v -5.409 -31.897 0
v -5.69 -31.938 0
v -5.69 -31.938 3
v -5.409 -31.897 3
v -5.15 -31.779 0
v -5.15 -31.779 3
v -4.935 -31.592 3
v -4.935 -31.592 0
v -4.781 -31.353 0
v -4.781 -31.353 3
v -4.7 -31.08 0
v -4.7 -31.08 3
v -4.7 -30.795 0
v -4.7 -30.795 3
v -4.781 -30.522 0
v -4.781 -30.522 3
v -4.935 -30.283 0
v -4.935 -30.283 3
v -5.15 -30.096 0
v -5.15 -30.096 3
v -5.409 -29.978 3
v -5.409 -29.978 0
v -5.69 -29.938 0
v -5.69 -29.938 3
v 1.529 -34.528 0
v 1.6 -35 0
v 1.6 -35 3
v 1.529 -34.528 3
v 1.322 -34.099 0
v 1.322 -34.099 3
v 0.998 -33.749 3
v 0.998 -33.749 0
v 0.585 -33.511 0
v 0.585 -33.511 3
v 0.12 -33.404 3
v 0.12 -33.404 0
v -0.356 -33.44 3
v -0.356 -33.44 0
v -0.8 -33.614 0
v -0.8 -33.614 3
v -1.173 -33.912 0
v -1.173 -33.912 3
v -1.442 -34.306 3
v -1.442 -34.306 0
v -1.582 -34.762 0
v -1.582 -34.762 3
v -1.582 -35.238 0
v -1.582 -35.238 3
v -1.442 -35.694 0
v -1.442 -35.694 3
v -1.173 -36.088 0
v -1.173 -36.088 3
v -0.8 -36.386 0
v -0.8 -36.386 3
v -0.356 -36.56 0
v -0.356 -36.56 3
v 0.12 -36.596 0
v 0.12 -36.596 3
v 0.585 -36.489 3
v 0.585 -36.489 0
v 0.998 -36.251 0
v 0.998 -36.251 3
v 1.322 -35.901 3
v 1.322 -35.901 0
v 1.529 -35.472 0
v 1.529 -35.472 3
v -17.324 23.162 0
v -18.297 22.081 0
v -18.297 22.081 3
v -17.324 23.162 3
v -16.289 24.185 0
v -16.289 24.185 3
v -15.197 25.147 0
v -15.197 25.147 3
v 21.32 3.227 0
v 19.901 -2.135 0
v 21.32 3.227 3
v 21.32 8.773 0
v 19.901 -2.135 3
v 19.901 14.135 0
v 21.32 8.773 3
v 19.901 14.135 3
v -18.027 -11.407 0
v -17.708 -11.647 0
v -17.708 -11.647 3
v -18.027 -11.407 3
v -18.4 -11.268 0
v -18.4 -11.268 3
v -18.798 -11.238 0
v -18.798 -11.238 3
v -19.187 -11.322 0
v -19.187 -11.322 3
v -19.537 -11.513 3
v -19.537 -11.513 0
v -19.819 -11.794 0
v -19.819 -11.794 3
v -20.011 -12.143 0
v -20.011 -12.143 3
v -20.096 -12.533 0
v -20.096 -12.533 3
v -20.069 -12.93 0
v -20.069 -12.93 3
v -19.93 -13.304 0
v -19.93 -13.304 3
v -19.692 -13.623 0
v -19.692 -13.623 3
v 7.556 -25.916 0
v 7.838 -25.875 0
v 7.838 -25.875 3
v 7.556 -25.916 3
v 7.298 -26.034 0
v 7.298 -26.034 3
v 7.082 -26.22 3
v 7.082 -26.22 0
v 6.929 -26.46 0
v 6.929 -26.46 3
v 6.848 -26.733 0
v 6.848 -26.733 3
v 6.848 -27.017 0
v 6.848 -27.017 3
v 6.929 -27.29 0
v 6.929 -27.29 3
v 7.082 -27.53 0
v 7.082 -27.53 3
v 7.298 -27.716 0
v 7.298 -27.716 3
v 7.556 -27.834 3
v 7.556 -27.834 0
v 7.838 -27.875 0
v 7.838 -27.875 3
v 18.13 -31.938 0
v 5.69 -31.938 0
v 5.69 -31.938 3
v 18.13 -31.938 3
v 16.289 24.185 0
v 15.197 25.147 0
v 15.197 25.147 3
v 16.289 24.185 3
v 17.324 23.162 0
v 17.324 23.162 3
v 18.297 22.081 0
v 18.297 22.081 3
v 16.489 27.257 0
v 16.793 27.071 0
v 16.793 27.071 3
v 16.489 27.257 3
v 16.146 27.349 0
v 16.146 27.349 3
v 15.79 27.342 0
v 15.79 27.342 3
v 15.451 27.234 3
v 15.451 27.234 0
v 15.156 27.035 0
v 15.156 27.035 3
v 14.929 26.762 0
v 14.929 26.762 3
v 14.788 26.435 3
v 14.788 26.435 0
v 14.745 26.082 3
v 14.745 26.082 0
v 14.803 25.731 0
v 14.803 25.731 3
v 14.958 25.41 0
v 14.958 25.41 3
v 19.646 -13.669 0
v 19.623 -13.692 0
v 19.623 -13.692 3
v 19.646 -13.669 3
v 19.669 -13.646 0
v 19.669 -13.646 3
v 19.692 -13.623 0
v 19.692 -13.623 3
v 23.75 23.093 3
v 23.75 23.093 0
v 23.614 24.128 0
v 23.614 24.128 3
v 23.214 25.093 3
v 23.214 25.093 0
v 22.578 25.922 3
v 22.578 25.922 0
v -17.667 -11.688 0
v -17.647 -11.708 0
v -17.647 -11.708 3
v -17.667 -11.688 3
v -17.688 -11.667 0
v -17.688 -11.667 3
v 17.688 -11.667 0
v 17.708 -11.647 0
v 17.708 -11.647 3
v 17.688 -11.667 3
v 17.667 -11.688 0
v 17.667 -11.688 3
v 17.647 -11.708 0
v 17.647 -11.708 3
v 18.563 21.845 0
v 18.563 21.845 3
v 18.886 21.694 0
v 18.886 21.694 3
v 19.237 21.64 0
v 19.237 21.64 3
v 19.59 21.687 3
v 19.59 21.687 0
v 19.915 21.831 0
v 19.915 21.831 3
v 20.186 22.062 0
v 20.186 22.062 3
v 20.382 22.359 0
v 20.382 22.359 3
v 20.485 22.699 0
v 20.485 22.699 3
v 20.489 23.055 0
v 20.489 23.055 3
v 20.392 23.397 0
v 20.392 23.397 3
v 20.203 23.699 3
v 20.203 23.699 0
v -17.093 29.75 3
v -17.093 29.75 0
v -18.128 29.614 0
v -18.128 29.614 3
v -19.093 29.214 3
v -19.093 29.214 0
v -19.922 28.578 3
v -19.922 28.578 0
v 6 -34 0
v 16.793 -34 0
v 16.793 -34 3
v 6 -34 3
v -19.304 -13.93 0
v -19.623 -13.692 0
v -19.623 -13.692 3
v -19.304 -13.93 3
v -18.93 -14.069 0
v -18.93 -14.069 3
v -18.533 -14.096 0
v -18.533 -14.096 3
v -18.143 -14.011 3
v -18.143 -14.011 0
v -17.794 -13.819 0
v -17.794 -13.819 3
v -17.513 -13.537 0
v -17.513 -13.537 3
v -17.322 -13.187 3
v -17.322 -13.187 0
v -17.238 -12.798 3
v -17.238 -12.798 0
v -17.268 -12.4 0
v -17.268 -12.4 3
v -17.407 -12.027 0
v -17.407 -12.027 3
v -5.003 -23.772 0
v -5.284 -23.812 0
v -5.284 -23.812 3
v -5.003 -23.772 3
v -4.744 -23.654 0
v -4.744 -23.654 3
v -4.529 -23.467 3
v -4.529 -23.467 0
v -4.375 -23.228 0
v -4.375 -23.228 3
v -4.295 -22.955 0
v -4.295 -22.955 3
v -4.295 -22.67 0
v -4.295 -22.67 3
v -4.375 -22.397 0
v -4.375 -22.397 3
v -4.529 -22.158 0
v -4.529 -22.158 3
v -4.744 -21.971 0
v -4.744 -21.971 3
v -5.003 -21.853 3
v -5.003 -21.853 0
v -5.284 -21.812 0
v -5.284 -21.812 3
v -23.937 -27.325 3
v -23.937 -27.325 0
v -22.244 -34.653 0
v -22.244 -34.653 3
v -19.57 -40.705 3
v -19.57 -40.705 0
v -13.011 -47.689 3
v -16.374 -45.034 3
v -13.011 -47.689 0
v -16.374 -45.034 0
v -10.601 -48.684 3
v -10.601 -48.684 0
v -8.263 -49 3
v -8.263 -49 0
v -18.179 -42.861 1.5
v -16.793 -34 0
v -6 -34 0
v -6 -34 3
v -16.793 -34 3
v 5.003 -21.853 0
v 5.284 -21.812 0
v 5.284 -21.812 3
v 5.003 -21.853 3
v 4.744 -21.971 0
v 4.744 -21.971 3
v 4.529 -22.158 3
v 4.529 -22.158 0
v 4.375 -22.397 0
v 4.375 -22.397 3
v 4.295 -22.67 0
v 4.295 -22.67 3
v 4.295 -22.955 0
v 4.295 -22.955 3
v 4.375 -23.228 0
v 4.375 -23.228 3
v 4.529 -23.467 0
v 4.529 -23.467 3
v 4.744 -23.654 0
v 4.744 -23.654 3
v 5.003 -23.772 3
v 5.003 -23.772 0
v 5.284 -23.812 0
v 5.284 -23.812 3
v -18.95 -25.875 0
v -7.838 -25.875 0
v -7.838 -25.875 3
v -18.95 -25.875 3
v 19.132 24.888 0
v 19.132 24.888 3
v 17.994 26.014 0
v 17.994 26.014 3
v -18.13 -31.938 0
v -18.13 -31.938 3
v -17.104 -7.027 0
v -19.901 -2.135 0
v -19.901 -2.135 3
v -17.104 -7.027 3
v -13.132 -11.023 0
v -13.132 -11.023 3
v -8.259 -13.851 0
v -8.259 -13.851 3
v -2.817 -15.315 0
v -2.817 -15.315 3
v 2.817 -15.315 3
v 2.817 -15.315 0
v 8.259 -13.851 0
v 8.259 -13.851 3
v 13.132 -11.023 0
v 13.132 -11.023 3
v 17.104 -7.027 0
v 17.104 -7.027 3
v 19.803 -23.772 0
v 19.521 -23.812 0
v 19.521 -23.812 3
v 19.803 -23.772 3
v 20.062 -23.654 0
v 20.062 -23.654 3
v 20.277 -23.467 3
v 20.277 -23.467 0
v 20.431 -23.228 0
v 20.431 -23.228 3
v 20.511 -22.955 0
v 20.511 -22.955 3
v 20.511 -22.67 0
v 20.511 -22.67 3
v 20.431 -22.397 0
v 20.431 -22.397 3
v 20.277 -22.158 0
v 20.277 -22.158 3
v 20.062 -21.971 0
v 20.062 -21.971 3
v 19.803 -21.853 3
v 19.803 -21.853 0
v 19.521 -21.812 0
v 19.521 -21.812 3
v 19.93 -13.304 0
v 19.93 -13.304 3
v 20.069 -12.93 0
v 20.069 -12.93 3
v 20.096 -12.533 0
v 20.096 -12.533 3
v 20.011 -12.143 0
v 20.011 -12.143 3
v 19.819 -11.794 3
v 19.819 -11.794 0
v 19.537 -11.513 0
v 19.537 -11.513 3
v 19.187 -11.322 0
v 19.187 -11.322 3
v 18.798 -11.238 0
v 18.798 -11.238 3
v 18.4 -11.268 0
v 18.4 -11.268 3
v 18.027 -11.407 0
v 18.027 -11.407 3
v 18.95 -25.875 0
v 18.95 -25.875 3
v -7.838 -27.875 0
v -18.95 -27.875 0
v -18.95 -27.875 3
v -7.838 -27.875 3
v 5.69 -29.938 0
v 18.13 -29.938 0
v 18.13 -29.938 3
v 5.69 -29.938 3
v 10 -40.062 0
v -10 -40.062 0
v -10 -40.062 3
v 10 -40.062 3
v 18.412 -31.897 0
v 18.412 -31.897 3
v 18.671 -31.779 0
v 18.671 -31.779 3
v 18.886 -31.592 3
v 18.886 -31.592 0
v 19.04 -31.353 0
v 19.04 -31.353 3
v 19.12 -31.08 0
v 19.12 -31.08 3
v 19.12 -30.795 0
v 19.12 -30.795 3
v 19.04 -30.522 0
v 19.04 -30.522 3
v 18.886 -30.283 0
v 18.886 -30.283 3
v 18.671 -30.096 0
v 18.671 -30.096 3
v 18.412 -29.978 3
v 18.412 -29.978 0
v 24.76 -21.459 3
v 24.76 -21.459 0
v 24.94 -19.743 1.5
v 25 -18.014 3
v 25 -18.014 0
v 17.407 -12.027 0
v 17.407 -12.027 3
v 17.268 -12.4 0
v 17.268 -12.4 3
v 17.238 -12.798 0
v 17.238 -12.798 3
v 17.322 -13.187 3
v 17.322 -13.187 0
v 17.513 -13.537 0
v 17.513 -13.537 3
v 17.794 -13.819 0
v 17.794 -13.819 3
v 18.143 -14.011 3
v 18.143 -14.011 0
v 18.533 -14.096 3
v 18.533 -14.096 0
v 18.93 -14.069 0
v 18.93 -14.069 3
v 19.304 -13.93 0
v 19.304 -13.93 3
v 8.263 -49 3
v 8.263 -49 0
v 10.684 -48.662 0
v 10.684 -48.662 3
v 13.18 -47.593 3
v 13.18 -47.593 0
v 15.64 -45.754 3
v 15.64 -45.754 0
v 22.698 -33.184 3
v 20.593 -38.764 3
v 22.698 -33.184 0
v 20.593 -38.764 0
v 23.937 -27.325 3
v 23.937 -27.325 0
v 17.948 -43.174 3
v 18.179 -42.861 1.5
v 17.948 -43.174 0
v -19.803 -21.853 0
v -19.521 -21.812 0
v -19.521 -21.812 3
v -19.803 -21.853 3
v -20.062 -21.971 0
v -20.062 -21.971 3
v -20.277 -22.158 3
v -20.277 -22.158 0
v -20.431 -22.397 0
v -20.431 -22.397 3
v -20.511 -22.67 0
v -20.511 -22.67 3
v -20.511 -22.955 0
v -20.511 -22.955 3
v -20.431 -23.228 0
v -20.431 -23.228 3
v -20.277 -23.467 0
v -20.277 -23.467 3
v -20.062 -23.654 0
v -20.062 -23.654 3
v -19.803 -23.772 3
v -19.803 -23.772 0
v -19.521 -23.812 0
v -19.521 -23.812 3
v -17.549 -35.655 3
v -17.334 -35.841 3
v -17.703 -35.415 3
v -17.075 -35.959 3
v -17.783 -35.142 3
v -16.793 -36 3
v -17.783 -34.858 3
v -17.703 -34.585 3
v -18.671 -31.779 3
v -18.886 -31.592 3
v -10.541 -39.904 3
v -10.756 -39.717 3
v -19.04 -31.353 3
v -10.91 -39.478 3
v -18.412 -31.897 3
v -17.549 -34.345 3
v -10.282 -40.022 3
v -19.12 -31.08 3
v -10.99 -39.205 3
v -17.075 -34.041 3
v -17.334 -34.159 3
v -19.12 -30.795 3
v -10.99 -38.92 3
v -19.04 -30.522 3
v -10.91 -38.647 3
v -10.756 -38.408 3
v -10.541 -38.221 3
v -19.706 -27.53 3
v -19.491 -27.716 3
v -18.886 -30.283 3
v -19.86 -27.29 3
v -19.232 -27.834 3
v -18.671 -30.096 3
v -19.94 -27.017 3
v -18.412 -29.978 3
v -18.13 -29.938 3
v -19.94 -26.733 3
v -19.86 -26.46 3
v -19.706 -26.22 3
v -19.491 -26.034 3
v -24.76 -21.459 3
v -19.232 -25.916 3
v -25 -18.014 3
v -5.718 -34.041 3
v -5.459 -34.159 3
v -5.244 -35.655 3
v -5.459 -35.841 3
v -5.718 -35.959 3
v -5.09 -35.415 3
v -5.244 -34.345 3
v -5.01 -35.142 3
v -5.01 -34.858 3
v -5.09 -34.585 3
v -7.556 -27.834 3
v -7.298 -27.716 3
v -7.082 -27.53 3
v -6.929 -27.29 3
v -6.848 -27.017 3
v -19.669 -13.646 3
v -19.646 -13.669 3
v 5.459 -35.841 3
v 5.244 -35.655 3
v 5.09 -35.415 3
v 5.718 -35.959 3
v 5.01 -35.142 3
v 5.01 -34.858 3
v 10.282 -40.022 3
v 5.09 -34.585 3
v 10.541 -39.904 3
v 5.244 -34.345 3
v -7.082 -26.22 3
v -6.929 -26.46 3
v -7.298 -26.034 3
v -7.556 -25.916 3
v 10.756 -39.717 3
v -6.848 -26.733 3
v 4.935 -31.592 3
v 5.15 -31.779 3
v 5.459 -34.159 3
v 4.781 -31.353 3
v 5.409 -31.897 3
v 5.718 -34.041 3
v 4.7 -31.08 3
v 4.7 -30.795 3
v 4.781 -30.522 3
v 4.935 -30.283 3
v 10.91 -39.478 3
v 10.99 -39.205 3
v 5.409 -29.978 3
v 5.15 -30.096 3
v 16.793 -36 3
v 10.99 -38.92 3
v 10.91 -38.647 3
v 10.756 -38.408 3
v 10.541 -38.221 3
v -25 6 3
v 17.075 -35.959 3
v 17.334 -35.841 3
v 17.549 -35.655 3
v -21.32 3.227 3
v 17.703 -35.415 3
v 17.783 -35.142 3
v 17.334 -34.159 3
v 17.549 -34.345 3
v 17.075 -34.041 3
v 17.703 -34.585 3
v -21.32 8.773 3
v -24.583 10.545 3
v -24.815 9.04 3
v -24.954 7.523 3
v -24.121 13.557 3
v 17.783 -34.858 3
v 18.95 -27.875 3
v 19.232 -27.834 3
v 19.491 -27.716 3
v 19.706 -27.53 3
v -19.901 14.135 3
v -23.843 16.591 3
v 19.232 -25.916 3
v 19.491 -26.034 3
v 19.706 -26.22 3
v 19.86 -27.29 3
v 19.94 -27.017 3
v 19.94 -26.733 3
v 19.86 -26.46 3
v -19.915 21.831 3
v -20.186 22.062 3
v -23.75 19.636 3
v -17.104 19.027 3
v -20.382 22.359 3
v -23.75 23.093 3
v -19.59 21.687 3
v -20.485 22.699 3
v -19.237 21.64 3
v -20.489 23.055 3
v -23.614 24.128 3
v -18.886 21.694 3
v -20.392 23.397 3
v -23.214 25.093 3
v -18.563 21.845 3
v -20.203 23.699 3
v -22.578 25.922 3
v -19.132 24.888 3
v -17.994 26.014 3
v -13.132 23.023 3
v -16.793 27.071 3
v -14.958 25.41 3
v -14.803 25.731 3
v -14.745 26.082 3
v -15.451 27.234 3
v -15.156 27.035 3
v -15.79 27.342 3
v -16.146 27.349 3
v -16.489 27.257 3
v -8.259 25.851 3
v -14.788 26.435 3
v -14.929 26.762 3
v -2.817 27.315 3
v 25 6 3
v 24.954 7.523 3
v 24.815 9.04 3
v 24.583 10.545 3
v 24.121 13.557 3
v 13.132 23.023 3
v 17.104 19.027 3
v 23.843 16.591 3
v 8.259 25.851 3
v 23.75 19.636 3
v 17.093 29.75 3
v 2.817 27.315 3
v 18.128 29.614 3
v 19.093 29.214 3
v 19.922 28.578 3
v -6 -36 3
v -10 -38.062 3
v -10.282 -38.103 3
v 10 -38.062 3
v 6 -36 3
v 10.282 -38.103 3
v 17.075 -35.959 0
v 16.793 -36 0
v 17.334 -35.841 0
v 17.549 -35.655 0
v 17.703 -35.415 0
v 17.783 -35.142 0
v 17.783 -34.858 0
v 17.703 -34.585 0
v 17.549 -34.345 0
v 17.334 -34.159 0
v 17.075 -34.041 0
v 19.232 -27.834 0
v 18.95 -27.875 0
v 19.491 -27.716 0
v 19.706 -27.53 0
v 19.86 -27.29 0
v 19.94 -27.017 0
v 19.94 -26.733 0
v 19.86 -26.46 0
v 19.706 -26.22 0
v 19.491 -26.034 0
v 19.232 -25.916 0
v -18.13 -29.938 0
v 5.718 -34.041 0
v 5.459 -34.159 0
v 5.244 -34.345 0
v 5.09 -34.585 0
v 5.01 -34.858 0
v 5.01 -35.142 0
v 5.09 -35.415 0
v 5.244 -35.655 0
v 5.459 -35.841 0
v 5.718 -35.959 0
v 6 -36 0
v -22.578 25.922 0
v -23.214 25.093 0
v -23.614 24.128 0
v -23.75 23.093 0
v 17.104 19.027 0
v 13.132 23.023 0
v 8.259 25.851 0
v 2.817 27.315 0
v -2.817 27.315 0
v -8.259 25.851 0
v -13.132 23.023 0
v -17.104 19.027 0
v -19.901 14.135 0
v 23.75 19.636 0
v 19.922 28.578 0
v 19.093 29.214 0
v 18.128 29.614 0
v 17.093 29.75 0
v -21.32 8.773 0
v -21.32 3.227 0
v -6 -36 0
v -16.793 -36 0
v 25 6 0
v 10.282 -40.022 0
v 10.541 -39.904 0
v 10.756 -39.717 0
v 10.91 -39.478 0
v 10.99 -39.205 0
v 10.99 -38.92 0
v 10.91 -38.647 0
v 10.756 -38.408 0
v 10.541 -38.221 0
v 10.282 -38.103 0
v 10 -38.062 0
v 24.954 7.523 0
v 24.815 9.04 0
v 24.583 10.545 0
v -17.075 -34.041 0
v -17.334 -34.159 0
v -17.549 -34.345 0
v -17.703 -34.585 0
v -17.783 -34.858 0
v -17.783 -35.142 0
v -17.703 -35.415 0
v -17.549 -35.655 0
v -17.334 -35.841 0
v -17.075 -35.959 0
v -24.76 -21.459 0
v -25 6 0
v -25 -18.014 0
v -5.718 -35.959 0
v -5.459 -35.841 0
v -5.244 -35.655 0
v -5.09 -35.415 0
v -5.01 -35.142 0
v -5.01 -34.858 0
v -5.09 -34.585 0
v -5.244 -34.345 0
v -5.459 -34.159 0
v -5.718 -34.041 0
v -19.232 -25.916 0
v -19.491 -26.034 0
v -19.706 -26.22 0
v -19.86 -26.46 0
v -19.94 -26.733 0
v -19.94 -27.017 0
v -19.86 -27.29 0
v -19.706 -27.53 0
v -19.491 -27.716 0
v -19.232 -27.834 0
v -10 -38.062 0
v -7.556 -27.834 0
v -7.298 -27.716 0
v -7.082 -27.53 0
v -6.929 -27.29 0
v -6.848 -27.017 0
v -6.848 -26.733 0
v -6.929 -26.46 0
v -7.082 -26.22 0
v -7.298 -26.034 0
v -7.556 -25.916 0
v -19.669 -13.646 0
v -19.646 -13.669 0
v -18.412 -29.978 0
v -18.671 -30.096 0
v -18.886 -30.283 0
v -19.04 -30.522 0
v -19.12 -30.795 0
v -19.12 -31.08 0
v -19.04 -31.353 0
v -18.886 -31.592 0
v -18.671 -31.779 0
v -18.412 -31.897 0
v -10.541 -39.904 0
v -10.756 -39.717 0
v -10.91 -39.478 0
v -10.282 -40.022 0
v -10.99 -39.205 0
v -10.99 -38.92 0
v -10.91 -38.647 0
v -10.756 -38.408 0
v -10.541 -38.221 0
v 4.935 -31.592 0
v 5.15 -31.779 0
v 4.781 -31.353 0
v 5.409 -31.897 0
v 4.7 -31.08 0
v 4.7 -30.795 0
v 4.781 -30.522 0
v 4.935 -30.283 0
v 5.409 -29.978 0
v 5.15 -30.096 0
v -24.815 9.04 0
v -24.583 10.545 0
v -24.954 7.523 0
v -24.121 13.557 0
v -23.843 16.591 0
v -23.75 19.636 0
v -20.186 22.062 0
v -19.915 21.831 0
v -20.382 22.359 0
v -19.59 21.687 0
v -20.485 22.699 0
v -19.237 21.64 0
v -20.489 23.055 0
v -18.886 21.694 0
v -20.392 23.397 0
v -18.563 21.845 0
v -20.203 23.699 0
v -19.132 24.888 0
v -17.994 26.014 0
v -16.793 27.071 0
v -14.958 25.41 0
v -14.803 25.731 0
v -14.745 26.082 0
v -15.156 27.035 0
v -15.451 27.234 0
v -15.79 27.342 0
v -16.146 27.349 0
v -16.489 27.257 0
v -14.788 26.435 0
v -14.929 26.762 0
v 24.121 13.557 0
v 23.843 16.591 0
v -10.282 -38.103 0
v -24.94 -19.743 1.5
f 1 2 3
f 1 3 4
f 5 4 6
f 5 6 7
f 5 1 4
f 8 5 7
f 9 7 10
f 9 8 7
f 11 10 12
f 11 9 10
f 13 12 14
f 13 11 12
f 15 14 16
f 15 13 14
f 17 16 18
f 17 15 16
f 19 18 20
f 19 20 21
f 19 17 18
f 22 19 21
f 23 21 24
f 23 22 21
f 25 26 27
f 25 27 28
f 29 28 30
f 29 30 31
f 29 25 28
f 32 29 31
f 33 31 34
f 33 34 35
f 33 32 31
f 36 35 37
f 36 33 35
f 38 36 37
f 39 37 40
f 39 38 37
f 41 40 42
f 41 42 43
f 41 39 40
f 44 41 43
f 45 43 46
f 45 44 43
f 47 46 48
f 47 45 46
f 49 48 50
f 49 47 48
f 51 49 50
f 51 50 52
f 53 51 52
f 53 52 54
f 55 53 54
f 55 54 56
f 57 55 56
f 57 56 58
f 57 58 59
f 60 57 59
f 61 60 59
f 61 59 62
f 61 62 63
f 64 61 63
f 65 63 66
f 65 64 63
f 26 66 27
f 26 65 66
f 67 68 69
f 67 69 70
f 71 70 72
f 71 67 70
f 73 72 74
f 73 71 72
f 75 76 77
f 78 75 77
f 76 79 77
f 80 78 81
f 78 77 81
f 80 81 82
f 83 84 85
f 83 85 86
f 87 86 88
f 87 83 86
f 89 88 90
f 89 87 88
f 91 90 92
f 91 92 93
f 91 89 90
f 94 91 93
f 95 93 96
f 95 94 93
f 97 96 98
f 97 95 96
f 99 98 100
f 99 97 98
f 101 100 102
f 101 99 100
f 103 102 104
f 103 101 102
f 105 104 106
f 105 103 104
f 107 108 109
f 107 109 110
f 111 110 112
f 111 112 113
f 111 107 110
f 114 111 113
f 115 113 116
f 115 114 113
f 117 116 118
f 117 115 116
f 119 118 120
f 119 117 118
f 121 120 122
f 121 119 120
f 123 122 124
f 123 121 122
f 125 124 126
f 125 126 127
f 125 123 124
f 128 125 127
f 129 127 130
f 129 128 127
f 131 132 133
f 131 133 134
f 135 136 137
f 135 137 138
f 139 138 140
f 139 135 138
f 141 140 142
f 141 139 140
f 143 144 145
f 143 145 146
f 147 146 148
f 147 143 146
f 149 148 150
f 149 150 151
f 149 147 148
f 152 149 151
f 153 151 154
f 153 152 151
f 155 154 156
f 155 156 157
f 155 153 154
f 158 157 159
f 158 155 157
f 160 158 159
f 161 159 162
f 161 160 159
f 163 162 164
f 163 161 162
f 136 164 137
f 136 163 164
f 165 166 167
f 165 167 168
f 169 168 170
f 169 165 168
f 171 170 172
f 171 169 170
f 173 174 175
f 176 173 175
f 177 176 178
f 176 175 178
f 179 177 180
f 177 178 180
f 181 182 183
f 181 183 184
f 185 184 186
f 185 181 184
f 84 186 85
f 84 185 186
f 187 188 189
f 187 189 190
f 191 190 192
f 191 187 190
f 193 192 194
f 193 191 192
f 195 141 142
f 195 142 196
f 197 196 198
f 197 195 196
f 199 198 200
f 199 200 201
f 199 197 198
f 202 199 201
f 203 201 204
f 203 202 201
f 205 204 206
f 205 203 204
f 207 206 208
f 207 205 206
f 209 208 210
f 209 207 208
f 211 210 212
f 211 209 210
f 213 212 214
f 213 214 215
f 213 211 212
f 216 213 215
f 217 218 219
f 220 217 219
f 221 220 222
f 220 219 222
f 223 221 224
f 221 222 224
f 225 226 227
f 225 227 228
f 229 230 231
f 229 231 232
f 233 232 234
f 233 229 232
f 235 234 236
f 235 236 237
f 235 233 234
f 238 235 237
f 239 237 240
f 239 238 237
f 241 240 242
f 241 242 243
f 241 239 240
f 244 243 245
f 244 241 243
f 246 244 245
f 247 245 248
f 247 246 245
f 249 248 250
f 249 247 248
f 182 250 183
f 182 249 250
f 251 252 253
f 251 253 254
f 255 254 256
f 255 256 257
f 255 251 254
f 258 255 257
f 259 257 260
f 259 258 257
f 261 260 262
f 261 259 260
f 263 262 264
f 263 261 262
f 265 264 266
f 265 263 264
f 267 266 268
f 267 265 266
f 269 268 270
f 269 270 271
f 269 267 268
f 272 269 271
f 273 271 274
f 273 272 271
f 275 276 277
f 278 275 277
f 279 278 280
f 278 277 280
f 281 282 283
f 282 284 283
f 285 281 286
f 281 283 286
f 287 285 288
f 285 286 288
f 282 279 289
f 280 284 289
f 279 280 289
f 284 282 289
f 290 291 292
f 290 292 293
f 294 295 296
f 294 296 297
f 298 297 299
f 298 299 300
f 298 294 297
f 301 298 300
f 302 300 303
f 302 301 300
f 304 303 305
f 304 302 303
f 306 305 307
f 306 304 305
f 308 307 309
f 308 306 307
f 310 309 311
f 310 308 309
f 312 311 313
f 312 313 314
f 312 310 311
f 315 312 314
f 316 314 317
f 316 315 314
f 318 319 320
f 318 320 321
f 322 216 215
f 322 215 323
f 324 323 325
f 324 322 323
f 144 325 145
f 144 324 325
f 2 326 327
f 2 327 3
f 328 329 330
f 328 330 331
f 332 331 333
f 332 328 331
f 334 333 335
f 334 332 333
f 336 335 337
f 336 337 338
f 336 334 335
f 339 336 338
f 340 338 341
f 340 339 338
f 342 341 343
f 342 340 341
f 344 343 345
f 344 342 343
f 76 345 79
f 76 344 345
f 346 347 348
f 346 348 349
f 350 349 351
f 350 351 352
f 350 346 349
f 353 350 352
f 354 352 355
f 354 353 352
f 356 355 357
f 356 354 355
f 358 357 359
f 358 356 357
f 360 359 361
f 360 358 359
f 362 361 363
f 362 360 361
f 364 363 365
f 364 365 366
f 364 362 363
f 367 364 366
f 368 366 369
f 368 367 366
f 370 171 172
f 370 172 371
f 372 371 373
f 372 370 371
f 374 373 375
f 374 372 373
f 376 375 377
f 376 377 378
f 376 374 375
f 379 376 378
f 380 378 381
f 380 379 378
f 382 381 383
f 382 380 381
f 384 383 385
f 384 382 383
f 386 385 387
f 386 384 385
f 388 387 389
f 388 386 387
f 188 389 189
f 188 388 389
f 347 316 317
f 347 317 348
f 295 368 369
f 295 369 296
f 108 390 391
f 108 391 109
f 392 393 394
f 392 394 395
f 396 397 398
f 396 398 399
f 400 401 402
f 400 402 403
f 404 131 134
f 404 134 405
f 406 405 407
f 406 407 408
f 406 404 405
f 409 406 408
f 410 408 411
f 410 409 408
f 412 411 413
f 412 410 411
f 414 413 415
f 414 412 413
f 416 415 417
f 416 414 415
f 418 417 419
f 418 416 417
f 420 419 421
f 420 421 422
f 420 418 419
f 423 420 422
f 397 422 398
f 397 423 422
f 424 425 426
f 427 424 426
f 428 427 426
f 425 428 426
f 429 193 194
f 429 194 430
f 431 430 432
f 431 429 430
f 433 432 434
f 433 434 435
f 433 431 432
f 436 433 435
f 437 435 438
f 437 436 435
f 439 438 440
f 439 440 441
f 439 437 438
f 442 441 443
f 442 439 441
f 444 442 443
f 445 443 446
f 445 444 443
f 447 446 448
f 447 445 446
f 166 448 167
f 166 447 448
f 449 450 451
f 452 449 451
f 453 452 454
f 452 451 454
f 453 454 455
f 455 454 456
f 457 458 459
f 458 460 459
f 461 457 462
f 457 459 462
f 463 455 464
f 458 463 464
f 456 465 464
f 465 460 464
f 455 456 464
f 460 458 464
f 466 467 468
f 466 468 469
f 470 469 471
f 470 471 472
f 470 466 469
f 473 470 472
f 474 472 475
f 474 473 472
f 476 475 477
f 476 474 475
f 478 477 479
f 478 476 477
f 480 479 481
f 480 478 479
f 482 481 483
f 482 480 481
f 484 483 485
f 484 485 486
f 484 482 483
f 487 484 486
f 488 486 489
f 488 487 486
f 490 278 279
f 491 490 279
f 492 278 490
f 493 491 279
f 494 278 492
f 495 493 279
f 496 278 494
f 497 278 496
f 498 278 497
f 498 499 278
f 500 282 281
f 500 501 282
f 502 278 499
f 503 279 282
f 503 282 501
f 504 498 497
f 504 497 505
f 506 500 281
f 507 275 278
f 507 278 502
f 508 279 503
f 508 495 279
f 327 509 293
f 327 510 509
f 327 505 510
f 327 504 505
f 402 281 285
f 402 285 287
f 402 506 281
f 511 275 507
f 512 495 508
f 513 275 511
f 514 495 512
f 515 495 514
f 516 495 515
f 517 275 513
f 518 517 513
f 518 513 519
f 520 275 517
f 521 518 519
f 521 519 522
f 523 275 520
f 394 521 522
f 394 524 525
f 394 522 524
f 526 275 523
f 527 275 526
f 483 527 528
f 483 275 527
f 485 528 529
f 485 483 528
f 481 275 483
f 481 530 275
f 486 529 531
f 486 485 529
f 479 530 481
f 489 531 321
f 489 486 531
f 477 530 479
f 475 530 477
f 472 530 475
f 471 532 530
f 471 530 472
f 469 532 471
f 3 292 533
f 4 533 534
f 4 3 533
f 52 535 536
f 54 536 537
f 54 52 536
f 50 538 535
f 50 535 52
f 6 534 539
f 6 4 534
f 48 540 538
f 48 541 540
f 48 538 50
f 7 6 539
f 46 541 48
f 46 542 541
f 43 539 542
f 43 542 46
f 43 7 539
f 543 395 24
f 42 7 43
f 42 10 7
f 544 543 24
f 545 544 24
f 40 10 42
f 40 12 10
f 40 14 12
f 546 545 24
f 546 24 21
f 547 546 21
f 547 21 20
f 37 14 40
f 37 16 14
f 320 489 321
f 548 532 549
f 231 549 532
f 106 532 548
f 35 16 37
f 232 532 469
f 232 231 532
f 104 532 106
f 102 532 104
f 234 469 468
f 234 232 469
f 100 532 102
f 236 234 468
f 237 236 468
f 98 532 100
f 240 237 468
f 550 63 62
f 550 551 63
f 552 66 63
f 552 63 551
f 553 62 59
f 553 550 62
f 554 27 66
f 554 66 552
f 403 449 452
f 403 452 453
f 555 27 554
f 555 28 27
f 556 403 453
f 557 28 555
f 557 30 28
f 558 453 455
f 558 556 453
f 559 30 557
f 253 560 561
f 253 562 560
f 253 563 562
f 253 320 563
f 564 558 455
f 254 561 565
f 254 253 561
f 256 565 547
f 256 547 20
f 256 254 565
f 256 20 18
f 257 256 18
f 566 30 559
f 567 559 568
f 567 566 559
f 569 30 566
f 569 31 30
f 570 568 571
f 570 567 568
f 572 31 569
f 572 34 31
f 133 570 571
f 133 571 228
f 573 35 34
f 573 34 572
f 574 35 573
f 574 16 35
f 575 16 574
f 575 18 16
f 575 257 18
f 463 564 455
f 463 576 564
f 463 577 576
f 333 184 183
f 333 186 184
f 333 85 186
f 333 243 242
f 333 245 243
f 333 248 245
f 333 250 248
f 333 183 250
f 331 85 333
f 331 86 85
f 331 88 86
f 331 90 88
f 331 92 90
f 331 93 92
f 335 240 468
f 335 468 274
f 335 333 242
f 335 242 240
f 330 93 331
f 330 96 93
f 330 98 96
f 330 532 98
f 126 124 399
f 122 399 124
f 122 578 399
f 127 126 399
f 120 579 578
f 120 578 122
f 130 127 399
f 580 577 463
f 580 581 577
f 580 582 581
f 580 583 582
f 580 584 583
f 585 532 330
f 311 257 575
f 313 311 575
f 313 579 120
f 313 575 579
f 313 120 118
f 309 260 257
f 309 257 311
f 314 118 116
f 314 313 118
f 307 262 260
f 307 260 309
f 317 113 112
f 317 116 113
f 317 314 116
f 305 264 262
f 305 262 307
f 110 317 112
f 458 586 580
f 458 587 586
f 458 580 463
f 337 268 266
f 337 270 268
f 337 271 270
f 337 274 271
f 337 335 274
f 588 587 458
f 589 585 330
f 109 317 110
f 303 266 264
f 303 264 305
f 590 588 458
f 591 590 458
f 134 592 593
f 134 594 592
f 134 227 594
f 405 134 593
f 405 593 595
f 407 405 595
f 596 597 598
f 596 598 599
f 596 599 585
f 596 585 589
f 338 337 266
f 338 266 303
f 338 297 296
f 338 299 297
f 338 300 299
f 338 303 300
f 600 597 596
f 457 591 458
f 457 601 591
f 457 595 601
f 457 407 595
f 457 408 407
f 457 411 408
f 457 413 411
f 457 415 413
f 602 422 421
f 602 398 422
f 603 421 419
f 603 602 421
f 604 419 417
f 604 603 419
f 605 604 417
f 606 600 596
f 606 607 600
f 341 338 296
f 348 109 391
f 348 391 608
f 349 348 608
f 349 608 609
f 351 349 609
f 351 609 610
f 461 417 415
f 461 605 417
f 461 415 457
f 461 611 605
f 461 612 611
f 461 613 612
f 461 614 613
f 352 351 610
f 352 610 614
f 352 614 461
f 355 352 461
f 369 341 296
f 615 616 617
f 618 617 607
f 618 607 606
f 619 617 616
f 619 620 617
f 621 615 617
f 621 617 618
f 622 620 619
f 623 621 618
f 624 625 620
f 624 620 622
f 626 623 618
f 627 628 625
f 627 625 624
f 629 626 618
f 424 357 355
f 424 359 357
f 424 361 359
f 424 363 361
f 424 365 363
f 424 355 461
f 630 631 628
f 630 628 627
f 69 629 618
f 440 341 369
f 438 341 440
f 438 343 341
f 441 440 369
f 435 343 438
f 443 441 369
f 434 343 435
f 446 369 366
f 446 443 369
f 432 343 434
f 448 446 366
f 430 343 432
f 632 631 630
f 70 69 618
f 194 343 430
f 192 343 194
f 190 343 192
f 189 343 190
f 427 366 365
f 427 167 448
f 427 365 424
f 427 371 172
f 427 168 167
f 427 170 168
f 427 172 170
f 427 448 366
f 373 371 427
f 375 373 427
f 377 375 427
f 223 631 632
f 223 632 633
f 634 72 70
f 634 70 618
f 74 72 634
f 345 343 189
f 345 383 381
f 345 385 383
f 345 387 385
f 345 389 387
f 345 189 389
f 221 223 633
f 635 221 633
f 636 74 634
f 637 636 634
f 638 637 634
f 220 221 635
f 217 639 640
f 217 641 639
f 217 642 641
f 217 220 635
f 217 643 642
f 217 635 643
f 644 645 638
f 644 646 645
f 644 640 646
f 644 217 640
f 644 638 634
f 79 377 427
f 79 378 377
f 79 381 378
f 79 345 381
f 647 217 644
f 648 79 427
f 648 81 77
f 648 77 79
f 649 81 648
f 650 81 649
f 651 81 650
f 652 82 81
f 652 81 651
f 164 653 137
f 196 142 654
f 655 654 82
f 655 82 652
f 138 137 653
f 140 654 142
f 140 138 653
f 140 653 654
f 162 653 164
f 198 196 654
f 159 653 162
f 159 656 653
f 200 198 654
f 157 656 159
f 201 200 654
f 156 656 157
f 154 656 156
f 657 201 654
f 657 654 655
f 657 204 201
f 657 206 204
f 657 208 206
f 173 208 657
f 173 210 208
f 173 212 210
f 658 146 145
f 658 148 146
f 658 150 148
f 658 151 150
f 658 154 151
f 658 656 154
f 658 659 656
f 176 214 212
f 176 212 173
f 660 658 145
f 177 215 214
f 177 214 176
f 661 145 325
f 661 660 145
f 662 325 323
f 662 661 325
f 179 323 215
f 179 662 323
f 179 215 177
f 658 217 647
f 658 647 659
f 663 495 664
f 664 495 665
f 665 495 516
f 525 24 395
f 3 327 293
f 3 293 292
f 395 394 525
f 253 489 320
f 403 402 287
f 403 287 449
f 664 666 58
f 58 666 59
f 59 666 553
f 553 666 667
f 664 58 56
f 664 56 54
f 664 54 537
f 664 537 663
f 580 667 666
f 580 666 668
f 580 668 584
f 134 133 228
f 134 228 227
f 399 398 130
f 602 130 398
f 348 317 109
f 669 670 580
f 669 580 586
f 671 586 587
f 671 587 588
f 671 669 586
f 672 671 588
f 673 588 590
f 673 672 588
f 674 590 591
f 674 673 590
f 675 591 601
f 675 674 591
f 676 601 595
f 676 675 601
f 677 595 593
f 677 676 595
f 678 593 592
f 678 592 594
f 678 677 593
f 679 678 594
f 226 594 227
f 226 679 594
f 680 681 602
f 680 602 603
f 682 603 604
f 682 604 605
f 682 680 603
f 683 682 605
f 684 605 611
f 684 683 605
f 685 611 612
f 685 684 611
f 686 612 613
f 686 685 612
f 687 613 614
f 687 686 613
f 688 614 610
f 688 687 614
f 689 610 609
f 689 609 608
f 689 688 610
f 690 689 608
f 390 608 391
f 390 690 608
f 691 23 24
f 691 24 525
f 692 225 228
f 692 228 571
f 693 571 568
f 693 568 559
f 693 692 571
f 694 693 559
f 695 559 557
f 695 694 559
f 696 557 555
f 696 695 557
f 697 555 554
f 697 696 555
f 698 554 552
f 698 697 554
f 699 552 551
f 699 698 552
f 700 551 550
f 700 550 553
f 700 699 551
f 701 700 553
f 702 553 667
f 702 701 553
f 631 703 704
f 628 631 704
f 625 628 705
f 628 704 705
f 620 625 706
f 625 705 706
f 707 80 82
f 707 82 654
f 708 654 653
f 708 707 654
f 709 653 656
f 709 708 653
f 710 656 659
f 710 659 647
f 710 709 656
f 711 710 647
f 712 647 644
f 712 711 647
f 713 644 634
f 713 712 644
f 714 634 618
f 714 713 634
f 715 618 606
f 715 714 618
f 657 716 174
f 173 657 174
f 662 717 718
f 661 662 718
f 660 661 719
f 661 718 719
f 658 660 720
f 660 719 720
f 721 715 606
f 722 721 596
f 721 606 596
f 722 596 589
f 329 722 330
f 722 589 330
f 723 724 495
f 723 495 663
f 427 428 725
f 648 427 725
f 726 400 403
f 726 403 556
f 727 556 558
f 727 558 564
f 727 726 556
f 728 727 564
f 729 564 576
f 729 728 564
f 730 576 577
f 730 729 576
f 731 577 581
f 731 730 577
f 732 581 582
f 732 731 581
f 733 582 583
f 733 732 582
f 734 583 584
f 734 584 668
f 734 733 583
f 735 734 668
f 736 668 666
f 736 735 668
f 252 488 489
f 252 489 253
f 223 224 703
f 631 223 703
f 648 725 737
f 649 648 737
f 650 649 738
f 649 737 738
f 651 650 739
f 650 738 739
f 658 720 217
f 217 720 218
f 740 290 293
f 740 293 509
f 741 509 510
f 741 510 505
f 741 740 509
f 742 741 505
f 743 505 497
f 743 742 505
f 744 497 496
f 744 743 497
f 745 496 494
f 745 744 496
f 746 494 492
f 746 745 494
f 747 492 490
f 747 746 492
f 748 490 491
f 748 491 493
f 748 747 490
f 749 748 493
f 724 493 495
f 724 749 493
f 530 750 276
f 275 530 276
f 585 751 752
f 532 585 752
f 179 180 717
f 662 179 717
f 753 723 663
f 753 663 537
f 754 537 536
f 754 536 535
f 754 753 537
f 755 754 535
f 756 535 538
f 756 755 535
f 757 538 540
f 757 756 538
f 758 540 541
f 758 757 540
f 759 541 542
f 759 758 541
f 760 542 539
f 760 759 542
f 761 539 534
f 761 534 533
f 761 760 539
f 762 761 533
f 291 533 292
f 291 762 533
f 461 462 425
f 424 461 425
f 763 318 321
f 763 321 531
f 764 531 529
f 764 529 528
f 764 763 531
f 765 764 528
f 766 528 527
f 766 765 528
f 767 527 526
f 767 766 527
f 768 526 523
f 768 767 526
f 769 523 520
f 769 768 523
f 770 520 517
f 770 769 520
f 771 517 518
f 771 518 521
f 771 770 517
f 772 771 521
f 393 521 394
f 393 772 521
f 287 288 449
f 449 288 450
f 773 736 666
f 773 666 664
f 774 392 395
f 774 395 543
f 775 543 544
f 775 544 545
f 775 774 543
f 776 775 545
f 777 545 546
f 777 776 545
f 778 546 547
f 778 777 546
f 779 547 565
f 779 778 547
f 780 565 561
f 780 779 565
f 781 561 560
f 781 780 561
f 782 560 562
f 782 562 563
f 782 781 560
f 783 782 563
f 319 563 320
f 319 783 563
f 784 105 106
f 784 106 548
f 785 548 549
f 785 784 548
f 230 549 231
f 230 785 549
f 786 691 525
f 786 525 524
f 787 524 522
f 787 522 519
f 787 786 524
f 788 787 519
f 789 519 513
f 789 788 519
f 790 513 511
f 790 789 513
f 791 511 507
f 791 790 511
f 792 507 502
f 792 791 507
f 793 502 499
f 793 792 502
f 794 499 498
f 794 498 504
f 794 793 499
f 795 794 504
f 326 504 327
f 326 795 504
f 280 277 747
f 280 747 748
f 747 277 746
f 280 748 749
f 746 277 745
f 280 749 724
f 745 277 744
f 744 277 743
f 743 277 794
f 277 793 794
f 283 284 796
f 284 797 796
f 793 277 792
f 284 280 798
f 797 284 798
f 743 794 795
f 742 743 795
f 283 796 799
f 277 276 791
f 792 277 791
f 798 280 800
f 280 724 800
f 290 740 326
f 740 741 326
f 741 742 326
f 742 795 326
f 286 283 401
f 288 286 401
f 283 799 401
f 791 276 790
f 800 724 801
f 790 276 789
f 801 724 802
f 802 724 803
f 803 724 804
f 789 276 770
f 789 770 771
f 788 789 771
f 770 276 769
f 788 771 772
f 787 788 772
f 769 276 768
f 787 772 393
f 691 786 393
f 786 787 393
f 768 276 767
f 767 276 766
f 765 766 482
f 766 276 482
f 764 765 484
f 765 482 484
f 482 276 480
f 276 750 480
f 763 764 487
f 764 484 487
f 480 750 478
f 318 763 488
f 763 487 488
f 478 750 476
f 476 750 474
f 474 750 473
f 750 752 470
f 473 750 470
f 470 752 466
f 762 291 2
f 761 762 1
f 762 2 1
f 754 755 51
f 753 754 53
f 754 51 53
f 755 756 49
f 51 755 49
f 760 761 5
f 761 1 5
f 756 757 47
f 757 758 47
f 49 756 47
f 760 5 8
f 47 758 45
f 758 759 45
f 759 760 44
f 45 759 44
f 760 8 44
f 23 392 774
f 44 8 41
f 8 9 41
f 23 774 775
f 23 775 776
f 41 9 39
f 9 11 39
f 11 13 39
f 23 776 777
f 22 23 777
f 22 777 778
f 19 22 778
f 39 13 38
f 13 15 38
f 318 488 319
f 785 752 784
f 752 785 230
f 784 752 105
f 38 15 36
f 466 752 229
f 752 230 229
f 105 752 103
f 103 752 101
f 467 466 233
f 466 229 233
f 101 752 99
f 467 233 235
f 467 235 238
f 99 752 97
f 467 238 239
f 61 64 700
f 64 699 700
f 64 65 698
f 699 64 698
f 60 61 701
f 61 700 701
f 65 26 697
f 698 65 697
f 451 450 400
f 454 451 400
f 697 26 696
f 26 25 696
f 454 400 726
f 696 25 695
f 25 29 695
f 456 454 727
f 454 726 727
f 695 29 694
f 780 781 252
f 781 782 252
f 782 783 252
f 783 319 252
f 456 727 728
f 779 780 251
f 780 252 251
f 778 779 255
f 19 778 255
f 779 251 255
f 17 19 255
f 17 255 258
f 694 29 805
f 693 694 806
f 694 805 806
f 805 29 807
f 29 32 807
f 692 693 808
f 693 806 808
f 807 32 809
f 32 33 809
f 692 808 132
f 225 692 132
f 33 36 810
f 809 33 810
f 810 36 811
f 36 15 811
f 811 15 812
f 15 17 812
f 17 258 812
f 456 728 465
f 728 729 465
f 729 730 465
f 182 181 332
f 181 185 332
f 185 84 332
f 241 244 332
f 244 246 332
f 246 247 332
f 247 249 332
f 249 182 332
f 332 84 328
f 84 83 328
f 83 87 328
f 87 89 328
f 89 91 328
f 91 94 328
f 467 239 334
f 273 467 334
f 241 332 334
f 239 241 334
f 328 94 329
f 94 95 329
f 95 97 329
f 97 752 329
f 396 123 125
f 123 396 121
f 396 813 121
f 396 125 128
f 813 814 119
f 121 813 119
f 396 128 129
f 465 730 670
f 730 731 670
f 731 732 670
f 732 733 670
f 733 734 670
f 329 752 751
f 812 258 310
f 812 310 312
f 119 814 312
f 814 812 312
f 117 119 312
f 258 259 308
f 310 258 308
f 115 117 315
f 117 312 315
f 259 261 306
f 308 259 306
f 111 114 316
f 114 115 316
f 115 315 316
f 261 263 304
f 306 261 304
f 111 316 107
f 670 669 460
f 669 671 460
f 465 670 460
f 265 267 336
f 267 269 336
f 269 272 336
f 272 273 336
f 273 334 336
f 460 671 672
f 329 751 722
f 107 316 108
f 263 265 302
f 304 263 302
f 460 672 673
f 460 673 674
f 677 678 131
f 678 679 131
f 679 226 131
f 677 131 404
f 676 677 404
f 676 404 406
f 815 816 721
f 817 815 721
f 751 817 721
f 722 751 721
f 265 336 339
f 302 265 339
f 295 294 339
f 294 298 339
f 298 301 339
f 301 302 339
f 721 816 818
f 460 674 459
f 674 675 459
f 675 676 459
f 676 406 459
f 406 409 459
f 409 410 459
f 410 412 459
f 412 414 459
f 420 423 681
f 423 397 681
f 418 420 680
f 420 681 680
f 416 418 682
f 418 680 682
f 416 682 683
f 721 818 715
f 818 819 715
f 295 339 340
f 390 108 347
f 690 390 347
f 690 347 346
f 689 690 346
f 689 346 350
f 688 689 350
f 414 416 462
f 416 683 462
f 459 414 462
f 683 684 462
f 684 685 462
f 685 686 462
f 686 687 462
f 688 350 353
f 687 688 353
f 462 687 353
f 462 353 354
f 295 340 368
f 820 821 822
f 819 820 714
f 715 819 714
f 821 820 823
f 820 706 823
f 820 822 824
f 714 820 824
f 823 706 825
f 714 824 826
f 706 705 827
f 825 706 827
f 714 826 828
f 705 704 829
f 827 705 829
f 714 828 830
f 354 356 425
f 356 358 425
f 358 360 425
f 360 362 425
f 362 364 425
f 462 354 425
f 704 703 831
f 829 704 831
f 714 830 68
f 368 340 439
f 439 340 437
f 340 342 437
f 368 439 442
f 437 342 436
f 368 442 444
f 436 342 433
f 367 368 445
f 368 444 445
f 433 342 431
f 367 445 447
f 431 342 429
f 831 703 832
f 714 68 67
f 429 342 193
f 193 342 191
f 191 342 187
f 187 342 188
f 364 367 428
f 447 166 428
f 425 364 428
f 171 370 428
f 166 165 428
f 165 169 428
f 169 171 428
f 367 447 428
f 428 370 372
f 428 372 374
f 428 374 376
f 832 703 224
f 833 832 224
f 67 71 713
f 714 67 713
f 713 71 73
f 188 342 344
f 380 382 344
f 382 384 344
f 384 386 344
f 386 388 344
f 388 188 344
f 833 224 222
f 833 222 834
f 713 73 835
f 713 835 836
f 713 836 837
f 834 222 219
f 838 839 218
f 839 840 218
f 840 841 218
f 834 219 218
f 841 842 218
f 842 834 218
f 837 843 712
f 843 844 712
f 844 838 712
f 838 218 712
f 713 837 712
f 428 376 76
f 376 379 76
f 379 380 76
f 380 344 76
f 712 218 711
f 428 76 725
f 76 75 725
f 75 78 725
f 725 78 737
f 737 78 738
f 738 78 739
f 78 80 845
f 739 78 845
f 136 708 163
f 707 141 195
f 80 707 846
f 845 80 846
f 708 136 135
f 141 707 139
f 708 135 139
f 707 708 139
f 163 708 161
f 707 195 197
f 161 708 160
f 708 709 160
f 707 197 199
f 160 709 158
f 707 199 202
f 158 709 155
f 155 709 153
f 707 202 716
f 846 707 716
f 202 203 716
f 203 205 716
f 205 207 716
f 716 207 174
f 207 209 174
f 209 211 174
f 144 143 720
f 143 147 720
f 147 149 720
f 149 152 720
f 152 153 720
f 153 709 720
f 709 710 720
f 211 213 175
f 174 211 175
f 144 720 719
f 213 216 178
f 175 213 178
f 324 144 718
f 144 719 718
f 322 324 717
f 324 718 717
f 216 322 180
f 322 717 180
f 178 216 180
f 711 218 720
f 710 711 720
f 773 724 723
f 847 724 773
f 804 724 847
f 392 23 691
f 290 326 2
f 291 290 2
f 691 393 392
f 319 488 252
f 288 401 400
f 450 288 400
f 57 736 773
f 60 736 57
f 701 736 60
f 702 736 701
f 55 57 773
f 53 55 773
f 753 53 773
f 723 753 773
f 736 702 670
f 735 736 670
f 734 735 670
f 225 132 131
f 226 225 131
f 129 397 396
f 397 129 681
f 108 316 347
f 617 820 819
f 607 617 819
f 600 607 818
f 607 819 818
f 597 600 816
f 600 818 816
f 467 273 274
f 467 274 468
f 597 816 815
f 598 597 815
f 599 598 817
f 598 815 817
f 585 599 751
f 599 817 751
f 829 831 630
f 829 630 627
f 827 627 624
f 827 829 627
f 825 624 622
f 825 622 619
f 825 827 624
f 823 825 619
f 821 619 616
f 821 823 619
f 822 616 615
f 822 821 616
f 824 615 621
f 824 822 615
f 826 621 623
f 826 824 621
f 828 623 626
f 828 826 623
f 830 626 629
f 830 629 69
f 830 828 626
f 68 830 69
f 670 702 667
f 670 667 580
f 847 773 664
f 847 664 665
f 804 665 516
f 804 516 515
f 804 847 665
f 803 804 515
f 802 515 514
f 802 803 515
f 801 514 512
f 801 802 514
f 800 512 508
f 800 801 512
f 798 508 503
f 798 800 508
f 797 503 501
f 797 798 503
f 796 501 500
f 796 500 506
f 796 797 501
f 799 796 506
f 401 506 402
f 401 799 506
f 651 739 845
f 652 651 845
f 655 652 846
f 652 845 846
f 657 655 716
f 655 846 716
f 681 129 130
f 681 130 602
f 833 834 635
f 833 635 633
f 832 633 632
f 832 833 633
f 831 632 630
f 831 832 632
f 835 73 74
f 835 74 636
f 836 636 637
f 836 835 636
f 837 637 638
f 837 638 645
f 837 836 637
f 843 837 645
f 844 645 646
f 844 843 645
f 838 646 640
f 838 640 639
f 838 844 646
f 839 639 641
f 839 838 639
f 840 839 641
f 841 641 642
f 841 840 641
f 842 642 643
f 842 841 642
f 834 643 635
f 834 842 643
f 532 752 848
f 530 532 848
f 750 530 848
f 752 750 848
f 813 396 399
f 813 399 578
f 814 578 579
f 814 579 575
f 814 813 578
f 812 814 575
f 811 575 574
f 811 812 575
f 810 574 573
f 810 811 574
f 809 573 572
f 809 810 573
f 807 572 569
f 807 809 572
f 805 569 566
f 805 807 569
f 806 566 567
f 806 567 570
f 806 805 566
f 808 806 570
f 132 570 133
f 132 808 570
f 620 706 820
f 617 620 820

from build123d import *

# Parameters (mm, degrees)
SKETCH1_R           = 1.6
SKETCH1_R_2         = 1.25
SKETCH1_R_3         = 4
BOSS_EXTRUDE1_DEPTH = 3
SKETCH2_R           = 21.5
CUT_EXTRUDE1_DEPTH  = 56.090834223


with BuildPart() as part:
    # Sketch1 → Boss-Extrude1 (new body)
    with BuildSketch(Plane.XY):
        with BuildLine():
            add(Edge.make_bspline(
                [(-23.936908844, -27.324524486), (-20.894736842, -49), (-8.26270655, -49)],
                knots=[1.708421538, 1.708421538, 1.708421538, 3.107039678, 3.107039678, 3.107039678], degree=2, weights=[1, 0.765287114, 1]))
            Line((-8.26270655, -49), (8.26270655, -49))
            add(Edge.make_bspline(
                [(8.26270655, -49), (20.894736842, -49), (23.936908844, -27.324524486)],
                knots=[0.034552975, 0.034552975, 0.034552975, 1.433171116, 1.433171116, 1.433171116], degree=2, weights=[1, 0.765287114, 1]))
            Line((23.936908844, -27.324524486), (24.760179539, -21.458720786))
            add(Edge.make_bspline(
                [(24.760179539, -21.458720786), (25, -19.75), (25, -18.013516259)],
                knots=[1.391738704, 1.391738704, 1.391738704, 1.570796327, 1.570796327, 1.570796327], degree=2, weights=[1, 0.995994972, 1]))
            Line((25, -18.013516259), (25, 6))
            ThreePointArc((25, 6), (24.89561541, 8.282177323), (24.583333333, 10.545296714))
            ThreePointArc((24.583333333, 10.545296714), (23.958769179, 15.071535497), (23.75, 19.635890143))
            Line((23.75, 19.635890143), (23.75, 23.093145751))
            ThreePointArc((23.75, 23.093145751), (23.44551813, 24.62387948), (22.578427125, 25.921572875))
            Line((22.578427125, 25.921572875), (19.921572875, 28.578427125))
            ThreePointArc((19.921572875, 28.578427125), (18.62387948, 29.44551813), (17.093145751, 29.75))
            Line((17.093145751, 29.75), (-17.093145751, 29.75))
            ThreePointArc((-17.093145751, 29.75), (-18.62387948, 29.44551813), (-19.921572875, 28.578427125))
            Line((-19.921572875, 28.578427125), (-22.578427125, 25.921572875))
            ThreePointArc((-22.578427125, 25.921572875), (-23.44551813, 24.62387948), (-23.75, 23.093145751))
            Line((-23.75, 23.093145751), (-23.75, 19.635890143))
            ThreePointArc((-23.75, 19.635890143), (-23.958769179, 15.071535497), (-24.583333333, 10.545296714))
            ThreePointArc((-24.583333333, 10.545296714), (-24.89561541, 8.282177323), (-25, 6))
            Line((-25, 6), (-25, -18.013516259))
            add(Edge.make_bspline(
                [(-25, -18.013516259), (-25, -19.75), (-24.760179539, -21.458720786)],
                knots=[4.71238898, 4.71238898, 4.71238898, 4.891446603, 4.891446603, 4.891446603], degree=2, weights=[1, 0.995994972, 1]))
            Line((-24.760179539, -21.458720786), (-23.936908844, -27.324524486))
        make_face()
        with BuildLine():
            Line((-16.793141988, -34), (-6, -34))
            ThreePointArc((-6, -34), (-5, -35), (-6, -36))
            Line((-6, -36), (-16.793141988, -36))
            ThreePointArc((-16.793141988, -36), (-17.793141988, -35), (-16.793141988, -34))
        make_face(mode=Mode.SUBTRACT)
        with BuildLine():
            Line((-18.129953736, -29.9375), (-5.690263266, -29.9375))
            ThreePointArc((-5.690263266, -29.9375), (-4.690263266, -30.9375), (-5.690263266, -31.9375))
            Line((-5.690263266, -31.9375), (-18.129953736, -31.9375))
            ThreePointArc((-18.129953736, -31.9375), (-19.129953736, -30.9375), (-18.129953736, -29.9375))
        make_face(mode=Mode.SUBTRACT)
        with BuildLine():
            Line((10, -40.0625), (-10, -40.0625))
            ThreePointArc((-10, -40.0625), (-11, -39.0625), (-10, -38.0625))
            Line((-10, -38.0625), (10, -38.0625))
            ThreePointArc((10, -38.0625), (11, -39.0625), (10, -40.0625))
        make_face(mode=Mode.SUBTRACT)
        with Locations((0, -35)):
            Circle(SKETCH1_R, mode=Mode.SUBTRACT)
        with BuildLine():
            Line((-18.950227736, -25.875), (-7.838149252, -25.875))
            ThreePointArc((-7.838149252, -25.875), (-6.838149252, -26.875), (-7.838149252, -27.875))
            Line((-7.838149252, -27.875), (-18.950227736, -27.875))
            ThreePointArc((-18.950227736, -27.875), (-19.950227736, -26.875), (-18.950227736, -25.875))
        make_face(mode=Mode.SUBTRACT)
        with BuildLine():
            ThreePointArc((-19.623229665, -13.691847489), (-19.657568517, -13.657568517), (-19.691847489, -13.623229665))
            ThreePointArc((-19.691847489, -13.623229665), (-19.688391915, -11.643333693), (-17.708495943, -11.646789267))
            ThreePointArc((-17.708495943, -11.646789267), (-17.67766953, -11.67766953), (-17.646789267, -11.708495943))
            ThreePointArc((-17.646789267, -11.708495943), (-17.643333693, -13.688391915), (-19.623229665, -13.691847489))
        make_face(mode=Mode.SUBTRACT)
        with BuildLine():
            Line((-19.521169673, -21.8125), (-5.284461571, -21.8125))
            ThreePointArc((-5.284461571, -21.8125), (-4.284461571, -22.8125), (-5.284461571, -23.8125))
            Line((-5.284461571, -23.8125), (-19.521169673, -23.8125))
            ThreePointArc((-19.521169673, -23.8125), (-20.521169673, -22.8125), (-19.521169673, -21.8125))
        make_face(mode=Mode.SUBTRACT)
        with BuildLine():
            Line((16.793141988, -36), (6, -36))
            ThreePointArc((6, -36), (5, -35), (6, -34))
            Line((6, -34), (16.793141988, -34))
            ThreePointArc((16.793141988, -34), (17.793141988, -35), (16.793141988, -36))
        make_face(mode=Mode.SUBTRACT)
        with BuildLine():
            Line((18.129953736, -31.9375), (5.690263266, -31.9375))
            ThreePointArc((5.690263266, -31.9375), (4.690263266, -30.9375), (5.690263266, -29.9375))
            Line((5.690263266, -29.9375), (18.129953736, -29.9375))
            ThreePointArc((18.129953736, -29.9375), (19.129953736, -30.9375), (18.129953736, -31.9375))
        make_face(mode=Mode.SUBTRACT)
        with BuildLine():
            Line((19.521169673, -23.8125), (5.284461571, -23.8125))
            ThreePointArc((5.284461571, -23.8125), (4.284461571, -22.8125), (5.284461571, -21.8125))
            Line((5.284461571, -21.8125), (19.521169673, -21.8125))
            ThreePointArc((19.521169673, -21.8125), (20.521169673, -22.8125), (19.521169673, -23.8125))
        make_face(mode=Mode.SUBTRACT)
        with BuildLine():
            Line((18.950227736, -27.875), (7.838149252, -27.875))
            ThreePointArc((7.838149252, -27.875), (6.838149252, -26.875), (7.838149252, -25.875))
            Line((7.838149252, -25.875), (18.950227736, -25.875))
            ThreePointArc((18.950227736, -25.875), (19.950227736, -26.875), (18.950227736, -27.875))
        make_face(mode=Mode.SUBTRACT)
        with BuildLine():
            ThreePointArc((19.623229665, -13.691847489), (17.643333693, -13.688391915), (17.646789267, -11.708495943))
            ThreePointArc((17.646789267, -11.708495943), (17.67766953, -11.67766953), (17.708495943, -11.646789267))
            ThreePointArc((17.708495943, -11.646789267), (19.688391915, -11.643333693), (19.691847489, -13.623229665))
            ThreePointArc((19.691847489, -13.623229665), (19.657568517, -13.657568517), (19.623229665, -13.691847489))
        make_face(mode=Mode.SUBTRACT)
        with BuildLine():
            Line((12.412191587, 2), (17.12454379, 2))
            ThreePointArc((17.12454379, 2), (19.615066366, 0.672512271), (19.901496836, -2.135135135))
            ThreePointArc((19.901496836, -2.135135135), (0, -15.5), (-19.901496836, -2.135135135))
            ThreePointArc((-19.901496836, -2.135135135), (-19.615066366, 0.672512271), (-17.12454379, 2))
            Line((-17.12454379, 2), (-12.412191587, 2))
            ThreePointArc((-12.412191587, 2), (-10.899090902, 1.590468358), (-9.799098622, 0.473684211))
            ThreePointArc((-9.799098622, 0.473684211), (0, -5.25), (9.799098622, 0.473684211))
            ThreePointArc((9.799098622, 0.473684211), (10.899090902, 1.590468358), (12.412191587, 2))
        make_face(mode=Mode.SUBTRACT)
        with Locations((-6.257723989, 7.758092853)):
            Circle(SKETCH1_R_2, mode=Mode.SUBTRACT)
        with Locations((0, 6)):
            Circle(SKETCH1_R_3, mode=Mode.SUBTRACT)
        with BuildLine():
            ThreePointArc((-16.792583358, 27.070791775), (-15.032451192, 26.906673654), (-15.196569313, 25.146541488))
            ThreePointArc((-15.196569313, 25.146541488), (-16.813726575, 23.681513271), (-18.296972803, 22.081048991))
            ThreePointArc((-18.296972803, 22.081048991), (-20.058850519, 21.936872312), (-20.203027197, 23.698750028))
            ThreePointArc((-20.203027197, 23.698750028), (-18.571456346, 25.459260737), (-16.792583358, 27.070791775))
        make_face(mode=Mode.SUBTRACT)
        with BuildLine():
            Line((17.12454379, 10), (12.412191587, 10))
            ThreePointArc((12.412191587, 10), (10.899090902, 10.409531642), (9.799098622, 11.526315789))
            ThreePointArc((9.799098622, 11.526315789), (0, 17.25), (-9.799098622, 11.526315789))
            ThreePointArc((-9.799098622, 11.526315789), (-10.899090902, 10.409531642), (-12.412191587, 10))
            Line((-12.412191587, 10), (-17.12454379, 10))
            ThreePointArc((-17.12454379, 10), (-19.615066366, 11.327487729), (-19.901496836, 14.135135135))
            ThreePointArc((-19.901496836, 14.135135135), (0, 27.5), (19.901496836, 14.135135135))
            ThreePointArc((19.901496836, 14.135135135), (19.615066366, 11.327487729), (17.12454379, 10))
        make_face(mode=Mode.SUBTRACT)
        with Locations((6.257723989, 4.241907147)):
            Circle(SKETCH1_R_2, mode=Mode.SUBTRACT)
        with BuildLine():
            ThreePointArc((20.203027197, 23.698750028), (20.058850519, 21.936872312), (18.296972803, 22.081048991))
            ThreePointArc((18.296972803, 22.081048991), (16.813726575, 23.681513271), (15.196569313, 25.146541488))
            ThreePointArc((15.196569313, 25.146541488), (15.032451192, 26.906673654), (16.792583358, 27.070791775))
            ThreePointArc((16.792583358, 27.070791775), (18.571456346, 25.459260737), (20.203027197, 23.698750028))
        make_face(mode=Mode.SUBTRACT)
    extrude(amount=BOSS_EXTRUDE1_DEPTH)

    # Sketch2 → Cut-Extrude1 (cut, through all)
    with BuildSketch(Plane.XY.offset(3)):
        with Locations((0, 6)):
            Circle(SKETCH2_R)
    extrude(amount=-CUT_EXTRUDE1_DEPTH, mode=Mode.SUBTRACT)


solid = part.part
